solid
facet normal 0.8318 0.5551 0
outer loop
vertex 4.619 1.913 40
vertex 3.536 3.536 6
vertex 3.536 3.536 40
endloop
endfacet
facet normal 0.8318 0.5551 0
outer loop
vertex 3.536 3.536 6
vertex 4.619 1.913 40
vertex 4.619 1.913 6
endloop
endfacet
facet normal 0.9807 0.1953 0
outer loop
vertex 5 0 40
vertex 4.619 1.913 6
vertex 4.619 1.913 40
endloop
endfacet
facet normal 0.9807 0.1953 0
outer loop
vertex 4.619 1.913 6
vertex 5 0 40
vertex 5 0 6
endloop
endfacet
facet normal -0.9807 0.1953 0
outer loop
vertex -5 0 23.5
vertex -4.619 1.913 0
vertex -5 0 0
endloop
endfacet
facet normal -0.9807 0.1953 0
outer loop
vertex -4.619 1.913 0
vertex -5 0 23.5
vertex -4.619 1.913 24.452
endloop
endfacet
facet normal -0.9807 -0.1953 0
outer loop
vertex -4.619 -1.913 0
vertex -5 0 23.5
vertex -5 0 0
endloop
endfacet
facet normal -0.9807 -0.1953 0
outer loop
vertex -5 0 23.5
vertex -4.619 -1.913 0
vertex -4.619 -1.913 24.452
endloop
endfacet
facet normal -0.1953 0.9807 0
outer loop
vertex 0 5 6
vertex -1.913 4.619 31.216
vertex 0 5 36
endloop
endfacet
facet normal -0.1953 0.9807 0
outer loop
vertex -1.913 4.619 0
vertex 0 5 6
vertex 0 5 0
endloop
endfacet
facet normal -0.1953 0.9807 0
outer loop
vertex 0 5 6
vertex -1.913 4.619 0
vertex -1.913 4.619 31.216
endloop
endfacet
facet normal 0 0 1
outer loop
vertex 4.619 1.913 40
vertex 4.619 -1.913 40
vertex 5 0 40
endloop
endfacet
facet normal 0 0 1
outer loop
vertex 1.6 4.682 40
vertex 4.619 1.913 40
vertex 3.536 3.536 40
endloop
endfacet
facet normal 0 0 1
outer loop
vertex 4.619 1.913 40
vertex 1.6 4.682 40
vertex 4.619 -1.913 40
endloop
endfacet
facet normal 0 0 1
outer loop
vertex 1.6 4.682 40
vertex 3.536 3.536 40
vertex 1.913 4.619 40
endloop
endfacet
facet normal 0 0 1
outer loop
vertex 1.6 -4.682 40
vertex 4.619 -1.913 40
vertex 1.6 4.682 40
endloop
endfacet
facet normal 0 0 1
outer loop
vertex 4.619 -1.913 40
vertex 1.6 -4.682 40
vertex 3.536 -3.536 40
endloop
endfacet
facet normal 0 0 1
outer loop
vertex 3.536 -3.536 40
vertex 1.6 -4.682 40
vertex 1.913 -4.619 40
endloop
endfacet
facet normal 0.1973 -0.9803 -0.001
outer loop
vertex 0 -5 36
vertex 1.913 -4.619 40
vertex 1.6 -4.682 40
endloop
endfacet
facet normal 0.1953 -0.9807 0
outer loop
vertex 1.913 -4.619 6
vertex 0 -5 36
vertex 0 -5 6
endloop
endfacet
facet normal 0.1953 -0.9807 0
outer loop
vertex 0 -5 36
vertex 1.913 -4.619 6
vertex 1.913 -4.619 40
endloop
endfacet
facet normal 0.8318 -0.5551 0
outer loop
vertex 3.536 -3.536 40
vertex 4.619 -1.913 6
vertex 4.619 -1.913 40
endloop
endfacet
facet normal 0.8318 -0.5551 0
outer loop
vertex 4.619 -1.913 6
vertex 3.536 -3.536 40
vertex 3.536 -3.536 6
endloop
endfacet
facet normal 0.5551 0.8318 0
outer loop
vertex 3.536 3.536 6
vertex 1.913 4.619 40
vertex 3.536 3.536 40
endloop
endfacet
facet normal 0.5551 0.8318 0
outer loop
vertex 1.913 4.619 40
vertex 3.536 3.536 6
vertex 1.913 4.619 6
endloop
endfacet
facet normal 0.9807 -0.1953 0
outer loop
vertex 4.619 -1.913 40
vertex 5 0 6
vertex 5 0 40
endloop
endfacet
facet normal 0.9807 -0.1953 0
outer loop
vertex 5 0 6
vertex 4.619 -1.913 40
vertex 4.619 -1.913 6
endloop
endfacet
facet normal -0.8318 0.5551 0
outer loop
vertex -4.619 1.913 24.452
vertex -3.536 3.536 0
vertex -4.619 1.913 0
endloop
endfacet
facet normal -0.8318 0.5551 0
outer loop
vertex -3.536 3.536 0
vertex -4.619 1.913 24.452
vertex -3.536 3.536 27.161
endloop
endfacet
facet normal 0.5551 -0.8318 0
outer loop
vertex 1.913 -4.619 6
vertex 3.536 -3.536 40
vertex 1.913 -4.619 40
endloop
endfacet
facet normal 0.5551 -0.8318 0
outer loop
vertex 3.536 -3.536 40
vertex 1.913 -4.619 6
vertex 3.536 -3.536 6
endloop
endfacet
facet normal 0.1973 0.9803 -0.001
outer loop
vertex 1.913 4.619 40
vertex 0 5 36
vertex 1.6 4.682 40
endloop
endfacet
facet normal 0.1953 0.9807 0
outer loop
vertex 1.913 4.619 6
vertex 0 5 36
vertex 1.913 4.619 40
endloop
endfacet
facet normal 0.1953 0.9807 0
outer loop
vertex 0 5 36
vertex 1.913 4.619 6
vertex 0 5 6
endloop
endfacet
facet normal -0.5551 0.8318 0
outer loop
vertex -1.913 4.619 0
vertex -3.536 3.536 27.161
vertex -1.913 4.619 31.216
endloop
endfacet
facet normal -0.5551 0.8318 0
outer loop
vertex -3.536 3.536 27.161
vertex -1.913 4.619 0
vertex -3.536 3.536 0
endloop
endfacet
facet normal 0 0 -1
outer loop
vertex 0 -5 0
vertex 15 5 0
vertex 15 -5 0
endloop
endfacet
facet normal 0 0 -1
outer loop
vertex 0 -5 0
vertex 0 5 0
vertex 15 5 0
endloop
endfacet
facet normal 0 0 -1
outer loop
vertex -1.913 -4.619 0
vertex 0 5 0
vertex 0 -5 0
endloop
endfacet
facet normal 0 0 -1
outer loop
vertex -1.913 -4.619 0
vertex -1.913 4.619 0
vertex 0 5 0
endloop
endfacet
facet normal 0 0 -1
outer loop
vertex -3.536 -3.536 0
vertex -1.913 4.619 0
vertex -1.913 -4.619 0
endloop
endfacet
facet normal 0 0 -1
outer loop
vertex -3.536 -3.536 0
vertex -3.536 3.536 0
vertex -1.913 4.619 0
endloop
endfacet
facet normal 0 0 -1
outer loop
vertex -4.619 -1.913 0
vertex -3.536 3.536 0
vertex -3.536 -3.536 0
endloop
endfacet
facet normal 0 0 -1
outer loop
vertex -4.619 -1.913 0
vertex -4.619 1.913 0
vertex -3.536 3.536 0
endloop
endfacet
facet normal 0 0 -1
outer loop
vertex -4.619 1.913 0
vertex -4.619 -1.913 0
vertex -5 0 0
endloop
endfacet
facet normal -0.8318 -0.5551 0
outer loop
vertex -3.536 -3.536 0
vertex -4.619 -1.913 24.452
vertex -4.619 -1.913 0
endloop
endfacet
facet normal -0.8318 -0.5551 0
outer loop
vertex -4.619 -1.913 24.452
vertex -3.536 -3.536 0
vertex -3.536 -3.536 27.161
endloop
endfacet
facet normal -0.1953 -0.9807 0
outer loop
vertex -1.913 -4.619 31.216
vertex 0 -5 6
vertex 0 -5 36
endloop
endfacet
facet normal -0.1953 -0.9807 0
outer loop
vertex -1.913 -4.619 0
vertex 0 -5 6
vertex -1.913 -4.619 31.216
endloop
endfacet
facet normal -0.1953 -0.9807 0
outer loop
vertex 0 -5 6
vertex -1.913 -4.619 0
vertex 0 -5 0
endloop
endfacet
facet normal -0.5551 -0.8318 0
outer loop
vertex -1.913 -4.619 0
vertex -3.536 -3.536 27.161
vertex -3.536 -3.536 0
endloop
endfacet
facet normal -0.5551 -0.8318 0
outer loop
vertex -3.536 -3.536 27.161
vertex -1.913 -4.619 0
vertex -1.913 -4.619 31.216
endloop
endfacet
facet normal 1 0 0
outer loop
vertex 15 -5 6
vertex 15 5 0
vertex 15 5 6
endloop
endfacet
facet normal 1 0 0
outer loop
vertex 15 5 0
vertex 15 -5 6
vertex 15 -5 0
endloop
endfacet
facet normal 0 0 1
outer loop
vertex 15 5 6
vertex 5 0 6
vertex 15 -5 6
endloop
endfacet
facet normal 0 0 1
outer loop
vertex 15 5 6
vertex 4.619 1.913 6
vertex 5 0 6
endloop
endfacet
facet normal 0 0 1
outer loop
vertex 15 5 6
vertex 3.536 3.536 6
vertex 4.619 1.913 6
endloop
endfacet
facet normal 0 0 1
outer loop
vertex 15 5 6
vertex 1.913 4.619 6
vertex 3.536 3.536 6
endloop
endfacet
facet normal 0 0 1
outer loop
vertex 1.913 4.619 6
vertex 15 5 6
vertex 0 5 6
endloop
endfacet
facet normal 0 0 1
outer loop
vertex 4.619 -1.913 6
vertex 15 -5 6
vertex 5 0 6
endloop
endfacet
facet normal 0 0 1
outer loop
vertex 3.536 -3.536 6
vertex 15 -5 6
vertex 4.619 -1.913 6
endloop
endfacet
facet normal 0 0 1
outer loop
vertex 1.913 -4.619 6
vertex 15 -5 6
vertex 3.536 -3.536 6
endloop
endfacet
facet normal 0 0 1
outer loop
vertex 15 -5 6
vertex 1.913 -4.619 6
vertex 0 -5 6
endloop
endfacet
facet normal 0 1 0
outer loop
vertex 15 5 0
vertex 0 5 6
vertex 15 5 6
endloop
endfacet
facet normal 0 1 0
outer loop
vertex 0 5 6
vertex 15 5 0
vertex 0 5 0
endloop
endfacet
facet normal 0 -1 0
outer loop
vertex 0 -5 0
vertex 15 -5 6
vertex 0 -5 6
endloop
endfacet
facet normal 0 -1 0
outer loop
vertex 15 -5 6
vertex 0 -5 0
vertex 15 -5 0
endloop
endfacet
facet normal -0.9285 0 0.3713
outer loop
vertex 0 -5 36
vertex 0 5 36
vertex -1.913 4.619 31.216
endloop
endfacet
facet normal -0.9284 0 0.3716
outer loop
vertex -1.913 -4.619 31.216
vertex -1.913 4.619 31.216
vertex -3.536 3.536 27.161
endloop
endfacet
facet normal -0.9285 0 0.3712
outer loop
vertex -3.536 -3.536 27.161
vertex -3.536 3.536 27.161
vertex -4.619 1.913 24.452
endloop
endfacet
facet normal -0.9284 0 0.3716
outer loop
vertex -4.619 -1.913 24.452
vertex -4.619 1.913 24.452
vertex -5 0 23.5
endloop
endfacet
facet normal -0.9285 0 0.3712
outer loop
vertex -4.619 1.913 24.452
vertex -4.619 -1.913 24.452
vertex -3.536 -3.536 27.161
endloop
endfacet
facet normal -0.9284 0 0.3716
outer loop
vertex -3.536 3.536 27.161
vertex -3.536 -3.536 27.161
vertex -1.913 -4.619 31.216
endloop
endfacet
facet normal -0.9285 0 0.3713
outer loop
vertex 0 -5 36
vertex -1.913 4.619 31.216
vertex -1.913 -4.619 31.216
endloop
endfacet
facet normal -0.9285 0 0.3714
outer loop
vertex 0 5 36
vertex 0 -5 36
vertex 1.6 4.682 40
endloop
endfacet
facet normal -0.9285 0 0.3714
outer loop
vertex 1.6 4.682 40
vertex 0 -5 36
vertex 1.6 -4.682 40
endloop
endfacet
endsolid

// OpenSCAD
difference() {
    union() {
        cylinder( r=5, h=40 );

        translate( [ 0, -5, 0 ] )
        cube( [ 15, 10, 6 ] );
    }

    mirror( [ 1, 0, 0 ] )
    translate( [ 6, 6, 21 ] )
    rotate( [ 0, -90, 0 ] )
    rotate( [ 90, 0, 0 ] )
    linear_extrude( 12 ) {
        polygon( [[ 0, 0 ], [ 30, 0 ], [ 30, 12 ]] );
    }
}
